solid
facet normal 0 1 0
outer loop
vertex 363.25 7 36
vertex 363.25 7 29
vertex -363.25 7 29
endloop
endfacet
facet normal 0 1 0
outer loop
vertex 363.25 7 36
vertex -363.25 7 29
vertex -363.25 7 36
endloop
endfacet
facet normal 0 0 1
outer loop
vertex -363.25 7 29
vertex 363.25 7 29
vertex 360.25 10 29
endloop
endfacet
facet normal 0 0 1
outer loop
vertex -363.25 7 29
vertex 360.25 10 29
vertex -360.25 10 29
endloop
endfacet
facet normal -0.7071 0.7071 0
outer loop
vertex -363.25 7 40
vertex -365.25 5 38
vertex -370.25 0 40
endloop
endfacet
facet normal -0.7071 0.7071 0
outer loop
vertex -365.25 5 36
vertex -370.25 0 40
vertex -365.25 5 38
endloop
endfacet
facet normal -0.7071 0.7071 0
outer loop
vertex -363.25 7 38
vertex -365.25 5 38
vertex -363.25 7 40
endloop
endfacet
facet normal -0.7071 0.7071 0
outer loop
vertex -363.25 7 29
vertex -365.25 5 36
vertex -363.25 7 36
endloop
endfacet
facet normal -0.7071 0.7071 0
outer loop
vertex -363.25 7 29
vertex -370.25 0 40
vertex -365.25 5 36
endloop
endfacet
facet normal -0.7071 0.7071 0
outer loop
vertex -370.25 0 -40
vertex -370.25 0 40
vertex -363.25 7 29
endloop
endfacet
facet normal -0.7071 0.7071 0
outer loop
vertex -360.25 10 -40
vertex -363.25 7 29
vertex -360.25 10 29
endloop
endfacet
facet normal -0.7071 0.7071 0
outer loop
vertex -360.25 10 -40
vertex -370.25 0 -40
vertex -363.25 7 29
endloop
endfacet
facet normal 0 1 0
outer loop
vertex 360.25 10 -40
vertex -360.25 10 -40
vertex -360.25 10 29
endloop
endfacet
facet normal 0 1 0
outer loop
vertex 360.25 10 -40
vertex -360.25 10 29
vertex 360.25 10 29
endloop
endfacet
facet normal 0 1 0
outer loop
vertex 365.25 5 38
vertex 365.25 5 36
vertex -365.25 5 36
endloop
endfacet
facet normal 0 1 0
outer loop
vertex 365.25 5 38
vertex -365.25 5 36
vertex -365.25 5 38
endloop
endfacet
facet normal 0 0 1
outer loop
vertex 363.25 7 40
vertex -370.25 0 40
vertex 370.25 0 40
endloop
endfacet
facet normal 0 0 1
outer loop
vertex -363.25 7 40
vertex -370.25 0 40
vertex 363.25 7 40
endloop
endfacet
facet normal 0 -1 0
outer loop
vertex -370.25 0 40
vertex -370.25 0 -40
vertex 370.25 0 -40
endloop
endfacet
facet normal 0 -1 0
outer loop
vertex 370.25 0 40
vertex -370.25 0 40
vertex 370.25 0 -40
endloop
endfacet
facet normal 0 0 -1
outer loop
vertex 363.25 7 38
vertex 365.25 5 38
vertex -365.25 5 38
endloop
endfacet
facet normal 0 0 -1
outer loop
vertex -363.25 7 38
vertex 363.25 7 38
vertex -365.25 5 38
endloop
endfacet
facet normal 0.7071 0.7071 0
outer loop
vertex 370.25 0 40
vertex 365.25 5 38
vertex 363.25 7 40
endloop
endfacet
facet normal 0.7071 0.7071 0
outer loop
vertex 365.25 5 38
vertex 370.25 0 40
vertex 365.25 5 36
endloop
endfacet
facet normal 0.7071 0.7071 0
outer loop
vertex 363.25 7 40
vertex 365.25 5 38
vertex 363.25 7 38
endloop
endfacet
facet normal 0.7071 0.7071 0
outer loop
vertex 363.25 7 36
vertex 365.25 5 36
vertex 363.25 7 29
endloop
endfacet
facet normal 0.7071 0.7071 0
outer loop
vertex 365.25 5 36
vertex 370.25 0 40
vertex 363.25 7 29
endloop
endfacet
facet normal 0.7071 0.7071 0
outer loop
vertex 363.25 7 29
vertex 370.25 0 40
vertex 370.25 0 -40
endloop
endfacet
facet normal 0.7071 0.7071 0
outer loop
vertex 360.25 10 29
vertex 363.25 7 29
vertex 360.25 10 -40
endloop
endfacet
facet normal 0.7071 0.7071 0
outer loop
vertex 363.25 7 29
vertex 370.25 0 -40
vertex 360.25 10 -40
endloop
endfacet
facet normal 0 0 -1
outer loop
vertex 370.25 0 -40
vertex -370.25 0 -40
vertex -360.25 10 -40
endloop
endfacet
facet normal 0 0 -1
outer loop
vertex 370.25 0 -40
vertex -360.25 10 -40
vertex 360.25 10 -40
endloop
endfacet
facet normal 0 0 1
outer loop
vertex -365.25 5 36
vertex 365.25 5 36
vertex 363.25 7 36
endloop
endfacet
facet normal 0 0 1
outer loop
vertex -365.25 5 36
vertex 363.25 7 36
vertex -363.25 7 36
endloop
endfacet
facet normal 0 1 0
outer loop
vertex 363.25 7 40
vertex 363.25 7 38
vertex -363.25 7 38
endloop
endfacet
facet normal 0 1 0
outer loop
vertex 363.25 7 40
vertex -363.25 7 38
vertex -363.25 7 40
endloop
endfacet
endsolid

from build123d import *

# Parameters (mm, degrees)
SKETCH1_W           = 740.5
SKETCH1_H           = 80
BOSS_EXTRUDE1_DEPTH = 10
SKETCH2_W           = 11
SKETCH2_H           = 3
CUT_EXTRUDE1_DEPTH  = 741.5
SKETCH3_W           = 2
SKETCH3_H           = 2
CUT_EXTRUDE2_DEPTH  = 741.5
CUT_EXTRUDE4_DEPTH  = 81


with BuildPart() as part:
    # Sketch1 → Boss-Extrude1 (new body)
    with BuildSketch(Plane(origin=(0, 0, 0), x_dir=(1, 0, 0), z_dir=(0, 1, 0))):
        Rectangle(SKETCH1_W, SKETCH1_H)
    extrude(amount=BOSS_EXTRUDE1_DEPTH)

    # Sketch2 → Cut-Extrude1 (cut, through all)
    with BuildSketch(Plane.ZY.offset(370.25)):
        with Locations((34.5, 8.5)):
            Rectangle(SKETCH2_W, SKETCH2_H)
    extrude(amount=-CUT_EXTRUDE1_DEPTH, mode=Mode.SUBTRACT)

    # Sketch3 → Cut-Extrude2 (cut, through all)
    with BuildSketch(Plane.ZY.offset(370.25)):
        with Locations((37, 6)):
            Rectangle(SKETCH3_W, SKETCH3_H)
    extrude(amount=-CUT_EXTRUDE2_DEPTH, mode=Mode.SUBTRACT)

    # Sketch4 → Cut-Extrude4 (cut, through all)
    with BuildSketch(Plane(origin=(0, 0, -40), x_dir=(-1, 0, 0), z_dir=(0, 0, -1))):
        Polygon((-370.25, 0), (-360.25, 10), (-370.25, 10), align=None)
        Polygon((370.25, 10), (370.25, 0), (360.25, 10), align=None)
    extrude(amount=-CUT_EXTRUDE4_DEPTH, mode=Mode.SUBTRACT)


solid = part.part
